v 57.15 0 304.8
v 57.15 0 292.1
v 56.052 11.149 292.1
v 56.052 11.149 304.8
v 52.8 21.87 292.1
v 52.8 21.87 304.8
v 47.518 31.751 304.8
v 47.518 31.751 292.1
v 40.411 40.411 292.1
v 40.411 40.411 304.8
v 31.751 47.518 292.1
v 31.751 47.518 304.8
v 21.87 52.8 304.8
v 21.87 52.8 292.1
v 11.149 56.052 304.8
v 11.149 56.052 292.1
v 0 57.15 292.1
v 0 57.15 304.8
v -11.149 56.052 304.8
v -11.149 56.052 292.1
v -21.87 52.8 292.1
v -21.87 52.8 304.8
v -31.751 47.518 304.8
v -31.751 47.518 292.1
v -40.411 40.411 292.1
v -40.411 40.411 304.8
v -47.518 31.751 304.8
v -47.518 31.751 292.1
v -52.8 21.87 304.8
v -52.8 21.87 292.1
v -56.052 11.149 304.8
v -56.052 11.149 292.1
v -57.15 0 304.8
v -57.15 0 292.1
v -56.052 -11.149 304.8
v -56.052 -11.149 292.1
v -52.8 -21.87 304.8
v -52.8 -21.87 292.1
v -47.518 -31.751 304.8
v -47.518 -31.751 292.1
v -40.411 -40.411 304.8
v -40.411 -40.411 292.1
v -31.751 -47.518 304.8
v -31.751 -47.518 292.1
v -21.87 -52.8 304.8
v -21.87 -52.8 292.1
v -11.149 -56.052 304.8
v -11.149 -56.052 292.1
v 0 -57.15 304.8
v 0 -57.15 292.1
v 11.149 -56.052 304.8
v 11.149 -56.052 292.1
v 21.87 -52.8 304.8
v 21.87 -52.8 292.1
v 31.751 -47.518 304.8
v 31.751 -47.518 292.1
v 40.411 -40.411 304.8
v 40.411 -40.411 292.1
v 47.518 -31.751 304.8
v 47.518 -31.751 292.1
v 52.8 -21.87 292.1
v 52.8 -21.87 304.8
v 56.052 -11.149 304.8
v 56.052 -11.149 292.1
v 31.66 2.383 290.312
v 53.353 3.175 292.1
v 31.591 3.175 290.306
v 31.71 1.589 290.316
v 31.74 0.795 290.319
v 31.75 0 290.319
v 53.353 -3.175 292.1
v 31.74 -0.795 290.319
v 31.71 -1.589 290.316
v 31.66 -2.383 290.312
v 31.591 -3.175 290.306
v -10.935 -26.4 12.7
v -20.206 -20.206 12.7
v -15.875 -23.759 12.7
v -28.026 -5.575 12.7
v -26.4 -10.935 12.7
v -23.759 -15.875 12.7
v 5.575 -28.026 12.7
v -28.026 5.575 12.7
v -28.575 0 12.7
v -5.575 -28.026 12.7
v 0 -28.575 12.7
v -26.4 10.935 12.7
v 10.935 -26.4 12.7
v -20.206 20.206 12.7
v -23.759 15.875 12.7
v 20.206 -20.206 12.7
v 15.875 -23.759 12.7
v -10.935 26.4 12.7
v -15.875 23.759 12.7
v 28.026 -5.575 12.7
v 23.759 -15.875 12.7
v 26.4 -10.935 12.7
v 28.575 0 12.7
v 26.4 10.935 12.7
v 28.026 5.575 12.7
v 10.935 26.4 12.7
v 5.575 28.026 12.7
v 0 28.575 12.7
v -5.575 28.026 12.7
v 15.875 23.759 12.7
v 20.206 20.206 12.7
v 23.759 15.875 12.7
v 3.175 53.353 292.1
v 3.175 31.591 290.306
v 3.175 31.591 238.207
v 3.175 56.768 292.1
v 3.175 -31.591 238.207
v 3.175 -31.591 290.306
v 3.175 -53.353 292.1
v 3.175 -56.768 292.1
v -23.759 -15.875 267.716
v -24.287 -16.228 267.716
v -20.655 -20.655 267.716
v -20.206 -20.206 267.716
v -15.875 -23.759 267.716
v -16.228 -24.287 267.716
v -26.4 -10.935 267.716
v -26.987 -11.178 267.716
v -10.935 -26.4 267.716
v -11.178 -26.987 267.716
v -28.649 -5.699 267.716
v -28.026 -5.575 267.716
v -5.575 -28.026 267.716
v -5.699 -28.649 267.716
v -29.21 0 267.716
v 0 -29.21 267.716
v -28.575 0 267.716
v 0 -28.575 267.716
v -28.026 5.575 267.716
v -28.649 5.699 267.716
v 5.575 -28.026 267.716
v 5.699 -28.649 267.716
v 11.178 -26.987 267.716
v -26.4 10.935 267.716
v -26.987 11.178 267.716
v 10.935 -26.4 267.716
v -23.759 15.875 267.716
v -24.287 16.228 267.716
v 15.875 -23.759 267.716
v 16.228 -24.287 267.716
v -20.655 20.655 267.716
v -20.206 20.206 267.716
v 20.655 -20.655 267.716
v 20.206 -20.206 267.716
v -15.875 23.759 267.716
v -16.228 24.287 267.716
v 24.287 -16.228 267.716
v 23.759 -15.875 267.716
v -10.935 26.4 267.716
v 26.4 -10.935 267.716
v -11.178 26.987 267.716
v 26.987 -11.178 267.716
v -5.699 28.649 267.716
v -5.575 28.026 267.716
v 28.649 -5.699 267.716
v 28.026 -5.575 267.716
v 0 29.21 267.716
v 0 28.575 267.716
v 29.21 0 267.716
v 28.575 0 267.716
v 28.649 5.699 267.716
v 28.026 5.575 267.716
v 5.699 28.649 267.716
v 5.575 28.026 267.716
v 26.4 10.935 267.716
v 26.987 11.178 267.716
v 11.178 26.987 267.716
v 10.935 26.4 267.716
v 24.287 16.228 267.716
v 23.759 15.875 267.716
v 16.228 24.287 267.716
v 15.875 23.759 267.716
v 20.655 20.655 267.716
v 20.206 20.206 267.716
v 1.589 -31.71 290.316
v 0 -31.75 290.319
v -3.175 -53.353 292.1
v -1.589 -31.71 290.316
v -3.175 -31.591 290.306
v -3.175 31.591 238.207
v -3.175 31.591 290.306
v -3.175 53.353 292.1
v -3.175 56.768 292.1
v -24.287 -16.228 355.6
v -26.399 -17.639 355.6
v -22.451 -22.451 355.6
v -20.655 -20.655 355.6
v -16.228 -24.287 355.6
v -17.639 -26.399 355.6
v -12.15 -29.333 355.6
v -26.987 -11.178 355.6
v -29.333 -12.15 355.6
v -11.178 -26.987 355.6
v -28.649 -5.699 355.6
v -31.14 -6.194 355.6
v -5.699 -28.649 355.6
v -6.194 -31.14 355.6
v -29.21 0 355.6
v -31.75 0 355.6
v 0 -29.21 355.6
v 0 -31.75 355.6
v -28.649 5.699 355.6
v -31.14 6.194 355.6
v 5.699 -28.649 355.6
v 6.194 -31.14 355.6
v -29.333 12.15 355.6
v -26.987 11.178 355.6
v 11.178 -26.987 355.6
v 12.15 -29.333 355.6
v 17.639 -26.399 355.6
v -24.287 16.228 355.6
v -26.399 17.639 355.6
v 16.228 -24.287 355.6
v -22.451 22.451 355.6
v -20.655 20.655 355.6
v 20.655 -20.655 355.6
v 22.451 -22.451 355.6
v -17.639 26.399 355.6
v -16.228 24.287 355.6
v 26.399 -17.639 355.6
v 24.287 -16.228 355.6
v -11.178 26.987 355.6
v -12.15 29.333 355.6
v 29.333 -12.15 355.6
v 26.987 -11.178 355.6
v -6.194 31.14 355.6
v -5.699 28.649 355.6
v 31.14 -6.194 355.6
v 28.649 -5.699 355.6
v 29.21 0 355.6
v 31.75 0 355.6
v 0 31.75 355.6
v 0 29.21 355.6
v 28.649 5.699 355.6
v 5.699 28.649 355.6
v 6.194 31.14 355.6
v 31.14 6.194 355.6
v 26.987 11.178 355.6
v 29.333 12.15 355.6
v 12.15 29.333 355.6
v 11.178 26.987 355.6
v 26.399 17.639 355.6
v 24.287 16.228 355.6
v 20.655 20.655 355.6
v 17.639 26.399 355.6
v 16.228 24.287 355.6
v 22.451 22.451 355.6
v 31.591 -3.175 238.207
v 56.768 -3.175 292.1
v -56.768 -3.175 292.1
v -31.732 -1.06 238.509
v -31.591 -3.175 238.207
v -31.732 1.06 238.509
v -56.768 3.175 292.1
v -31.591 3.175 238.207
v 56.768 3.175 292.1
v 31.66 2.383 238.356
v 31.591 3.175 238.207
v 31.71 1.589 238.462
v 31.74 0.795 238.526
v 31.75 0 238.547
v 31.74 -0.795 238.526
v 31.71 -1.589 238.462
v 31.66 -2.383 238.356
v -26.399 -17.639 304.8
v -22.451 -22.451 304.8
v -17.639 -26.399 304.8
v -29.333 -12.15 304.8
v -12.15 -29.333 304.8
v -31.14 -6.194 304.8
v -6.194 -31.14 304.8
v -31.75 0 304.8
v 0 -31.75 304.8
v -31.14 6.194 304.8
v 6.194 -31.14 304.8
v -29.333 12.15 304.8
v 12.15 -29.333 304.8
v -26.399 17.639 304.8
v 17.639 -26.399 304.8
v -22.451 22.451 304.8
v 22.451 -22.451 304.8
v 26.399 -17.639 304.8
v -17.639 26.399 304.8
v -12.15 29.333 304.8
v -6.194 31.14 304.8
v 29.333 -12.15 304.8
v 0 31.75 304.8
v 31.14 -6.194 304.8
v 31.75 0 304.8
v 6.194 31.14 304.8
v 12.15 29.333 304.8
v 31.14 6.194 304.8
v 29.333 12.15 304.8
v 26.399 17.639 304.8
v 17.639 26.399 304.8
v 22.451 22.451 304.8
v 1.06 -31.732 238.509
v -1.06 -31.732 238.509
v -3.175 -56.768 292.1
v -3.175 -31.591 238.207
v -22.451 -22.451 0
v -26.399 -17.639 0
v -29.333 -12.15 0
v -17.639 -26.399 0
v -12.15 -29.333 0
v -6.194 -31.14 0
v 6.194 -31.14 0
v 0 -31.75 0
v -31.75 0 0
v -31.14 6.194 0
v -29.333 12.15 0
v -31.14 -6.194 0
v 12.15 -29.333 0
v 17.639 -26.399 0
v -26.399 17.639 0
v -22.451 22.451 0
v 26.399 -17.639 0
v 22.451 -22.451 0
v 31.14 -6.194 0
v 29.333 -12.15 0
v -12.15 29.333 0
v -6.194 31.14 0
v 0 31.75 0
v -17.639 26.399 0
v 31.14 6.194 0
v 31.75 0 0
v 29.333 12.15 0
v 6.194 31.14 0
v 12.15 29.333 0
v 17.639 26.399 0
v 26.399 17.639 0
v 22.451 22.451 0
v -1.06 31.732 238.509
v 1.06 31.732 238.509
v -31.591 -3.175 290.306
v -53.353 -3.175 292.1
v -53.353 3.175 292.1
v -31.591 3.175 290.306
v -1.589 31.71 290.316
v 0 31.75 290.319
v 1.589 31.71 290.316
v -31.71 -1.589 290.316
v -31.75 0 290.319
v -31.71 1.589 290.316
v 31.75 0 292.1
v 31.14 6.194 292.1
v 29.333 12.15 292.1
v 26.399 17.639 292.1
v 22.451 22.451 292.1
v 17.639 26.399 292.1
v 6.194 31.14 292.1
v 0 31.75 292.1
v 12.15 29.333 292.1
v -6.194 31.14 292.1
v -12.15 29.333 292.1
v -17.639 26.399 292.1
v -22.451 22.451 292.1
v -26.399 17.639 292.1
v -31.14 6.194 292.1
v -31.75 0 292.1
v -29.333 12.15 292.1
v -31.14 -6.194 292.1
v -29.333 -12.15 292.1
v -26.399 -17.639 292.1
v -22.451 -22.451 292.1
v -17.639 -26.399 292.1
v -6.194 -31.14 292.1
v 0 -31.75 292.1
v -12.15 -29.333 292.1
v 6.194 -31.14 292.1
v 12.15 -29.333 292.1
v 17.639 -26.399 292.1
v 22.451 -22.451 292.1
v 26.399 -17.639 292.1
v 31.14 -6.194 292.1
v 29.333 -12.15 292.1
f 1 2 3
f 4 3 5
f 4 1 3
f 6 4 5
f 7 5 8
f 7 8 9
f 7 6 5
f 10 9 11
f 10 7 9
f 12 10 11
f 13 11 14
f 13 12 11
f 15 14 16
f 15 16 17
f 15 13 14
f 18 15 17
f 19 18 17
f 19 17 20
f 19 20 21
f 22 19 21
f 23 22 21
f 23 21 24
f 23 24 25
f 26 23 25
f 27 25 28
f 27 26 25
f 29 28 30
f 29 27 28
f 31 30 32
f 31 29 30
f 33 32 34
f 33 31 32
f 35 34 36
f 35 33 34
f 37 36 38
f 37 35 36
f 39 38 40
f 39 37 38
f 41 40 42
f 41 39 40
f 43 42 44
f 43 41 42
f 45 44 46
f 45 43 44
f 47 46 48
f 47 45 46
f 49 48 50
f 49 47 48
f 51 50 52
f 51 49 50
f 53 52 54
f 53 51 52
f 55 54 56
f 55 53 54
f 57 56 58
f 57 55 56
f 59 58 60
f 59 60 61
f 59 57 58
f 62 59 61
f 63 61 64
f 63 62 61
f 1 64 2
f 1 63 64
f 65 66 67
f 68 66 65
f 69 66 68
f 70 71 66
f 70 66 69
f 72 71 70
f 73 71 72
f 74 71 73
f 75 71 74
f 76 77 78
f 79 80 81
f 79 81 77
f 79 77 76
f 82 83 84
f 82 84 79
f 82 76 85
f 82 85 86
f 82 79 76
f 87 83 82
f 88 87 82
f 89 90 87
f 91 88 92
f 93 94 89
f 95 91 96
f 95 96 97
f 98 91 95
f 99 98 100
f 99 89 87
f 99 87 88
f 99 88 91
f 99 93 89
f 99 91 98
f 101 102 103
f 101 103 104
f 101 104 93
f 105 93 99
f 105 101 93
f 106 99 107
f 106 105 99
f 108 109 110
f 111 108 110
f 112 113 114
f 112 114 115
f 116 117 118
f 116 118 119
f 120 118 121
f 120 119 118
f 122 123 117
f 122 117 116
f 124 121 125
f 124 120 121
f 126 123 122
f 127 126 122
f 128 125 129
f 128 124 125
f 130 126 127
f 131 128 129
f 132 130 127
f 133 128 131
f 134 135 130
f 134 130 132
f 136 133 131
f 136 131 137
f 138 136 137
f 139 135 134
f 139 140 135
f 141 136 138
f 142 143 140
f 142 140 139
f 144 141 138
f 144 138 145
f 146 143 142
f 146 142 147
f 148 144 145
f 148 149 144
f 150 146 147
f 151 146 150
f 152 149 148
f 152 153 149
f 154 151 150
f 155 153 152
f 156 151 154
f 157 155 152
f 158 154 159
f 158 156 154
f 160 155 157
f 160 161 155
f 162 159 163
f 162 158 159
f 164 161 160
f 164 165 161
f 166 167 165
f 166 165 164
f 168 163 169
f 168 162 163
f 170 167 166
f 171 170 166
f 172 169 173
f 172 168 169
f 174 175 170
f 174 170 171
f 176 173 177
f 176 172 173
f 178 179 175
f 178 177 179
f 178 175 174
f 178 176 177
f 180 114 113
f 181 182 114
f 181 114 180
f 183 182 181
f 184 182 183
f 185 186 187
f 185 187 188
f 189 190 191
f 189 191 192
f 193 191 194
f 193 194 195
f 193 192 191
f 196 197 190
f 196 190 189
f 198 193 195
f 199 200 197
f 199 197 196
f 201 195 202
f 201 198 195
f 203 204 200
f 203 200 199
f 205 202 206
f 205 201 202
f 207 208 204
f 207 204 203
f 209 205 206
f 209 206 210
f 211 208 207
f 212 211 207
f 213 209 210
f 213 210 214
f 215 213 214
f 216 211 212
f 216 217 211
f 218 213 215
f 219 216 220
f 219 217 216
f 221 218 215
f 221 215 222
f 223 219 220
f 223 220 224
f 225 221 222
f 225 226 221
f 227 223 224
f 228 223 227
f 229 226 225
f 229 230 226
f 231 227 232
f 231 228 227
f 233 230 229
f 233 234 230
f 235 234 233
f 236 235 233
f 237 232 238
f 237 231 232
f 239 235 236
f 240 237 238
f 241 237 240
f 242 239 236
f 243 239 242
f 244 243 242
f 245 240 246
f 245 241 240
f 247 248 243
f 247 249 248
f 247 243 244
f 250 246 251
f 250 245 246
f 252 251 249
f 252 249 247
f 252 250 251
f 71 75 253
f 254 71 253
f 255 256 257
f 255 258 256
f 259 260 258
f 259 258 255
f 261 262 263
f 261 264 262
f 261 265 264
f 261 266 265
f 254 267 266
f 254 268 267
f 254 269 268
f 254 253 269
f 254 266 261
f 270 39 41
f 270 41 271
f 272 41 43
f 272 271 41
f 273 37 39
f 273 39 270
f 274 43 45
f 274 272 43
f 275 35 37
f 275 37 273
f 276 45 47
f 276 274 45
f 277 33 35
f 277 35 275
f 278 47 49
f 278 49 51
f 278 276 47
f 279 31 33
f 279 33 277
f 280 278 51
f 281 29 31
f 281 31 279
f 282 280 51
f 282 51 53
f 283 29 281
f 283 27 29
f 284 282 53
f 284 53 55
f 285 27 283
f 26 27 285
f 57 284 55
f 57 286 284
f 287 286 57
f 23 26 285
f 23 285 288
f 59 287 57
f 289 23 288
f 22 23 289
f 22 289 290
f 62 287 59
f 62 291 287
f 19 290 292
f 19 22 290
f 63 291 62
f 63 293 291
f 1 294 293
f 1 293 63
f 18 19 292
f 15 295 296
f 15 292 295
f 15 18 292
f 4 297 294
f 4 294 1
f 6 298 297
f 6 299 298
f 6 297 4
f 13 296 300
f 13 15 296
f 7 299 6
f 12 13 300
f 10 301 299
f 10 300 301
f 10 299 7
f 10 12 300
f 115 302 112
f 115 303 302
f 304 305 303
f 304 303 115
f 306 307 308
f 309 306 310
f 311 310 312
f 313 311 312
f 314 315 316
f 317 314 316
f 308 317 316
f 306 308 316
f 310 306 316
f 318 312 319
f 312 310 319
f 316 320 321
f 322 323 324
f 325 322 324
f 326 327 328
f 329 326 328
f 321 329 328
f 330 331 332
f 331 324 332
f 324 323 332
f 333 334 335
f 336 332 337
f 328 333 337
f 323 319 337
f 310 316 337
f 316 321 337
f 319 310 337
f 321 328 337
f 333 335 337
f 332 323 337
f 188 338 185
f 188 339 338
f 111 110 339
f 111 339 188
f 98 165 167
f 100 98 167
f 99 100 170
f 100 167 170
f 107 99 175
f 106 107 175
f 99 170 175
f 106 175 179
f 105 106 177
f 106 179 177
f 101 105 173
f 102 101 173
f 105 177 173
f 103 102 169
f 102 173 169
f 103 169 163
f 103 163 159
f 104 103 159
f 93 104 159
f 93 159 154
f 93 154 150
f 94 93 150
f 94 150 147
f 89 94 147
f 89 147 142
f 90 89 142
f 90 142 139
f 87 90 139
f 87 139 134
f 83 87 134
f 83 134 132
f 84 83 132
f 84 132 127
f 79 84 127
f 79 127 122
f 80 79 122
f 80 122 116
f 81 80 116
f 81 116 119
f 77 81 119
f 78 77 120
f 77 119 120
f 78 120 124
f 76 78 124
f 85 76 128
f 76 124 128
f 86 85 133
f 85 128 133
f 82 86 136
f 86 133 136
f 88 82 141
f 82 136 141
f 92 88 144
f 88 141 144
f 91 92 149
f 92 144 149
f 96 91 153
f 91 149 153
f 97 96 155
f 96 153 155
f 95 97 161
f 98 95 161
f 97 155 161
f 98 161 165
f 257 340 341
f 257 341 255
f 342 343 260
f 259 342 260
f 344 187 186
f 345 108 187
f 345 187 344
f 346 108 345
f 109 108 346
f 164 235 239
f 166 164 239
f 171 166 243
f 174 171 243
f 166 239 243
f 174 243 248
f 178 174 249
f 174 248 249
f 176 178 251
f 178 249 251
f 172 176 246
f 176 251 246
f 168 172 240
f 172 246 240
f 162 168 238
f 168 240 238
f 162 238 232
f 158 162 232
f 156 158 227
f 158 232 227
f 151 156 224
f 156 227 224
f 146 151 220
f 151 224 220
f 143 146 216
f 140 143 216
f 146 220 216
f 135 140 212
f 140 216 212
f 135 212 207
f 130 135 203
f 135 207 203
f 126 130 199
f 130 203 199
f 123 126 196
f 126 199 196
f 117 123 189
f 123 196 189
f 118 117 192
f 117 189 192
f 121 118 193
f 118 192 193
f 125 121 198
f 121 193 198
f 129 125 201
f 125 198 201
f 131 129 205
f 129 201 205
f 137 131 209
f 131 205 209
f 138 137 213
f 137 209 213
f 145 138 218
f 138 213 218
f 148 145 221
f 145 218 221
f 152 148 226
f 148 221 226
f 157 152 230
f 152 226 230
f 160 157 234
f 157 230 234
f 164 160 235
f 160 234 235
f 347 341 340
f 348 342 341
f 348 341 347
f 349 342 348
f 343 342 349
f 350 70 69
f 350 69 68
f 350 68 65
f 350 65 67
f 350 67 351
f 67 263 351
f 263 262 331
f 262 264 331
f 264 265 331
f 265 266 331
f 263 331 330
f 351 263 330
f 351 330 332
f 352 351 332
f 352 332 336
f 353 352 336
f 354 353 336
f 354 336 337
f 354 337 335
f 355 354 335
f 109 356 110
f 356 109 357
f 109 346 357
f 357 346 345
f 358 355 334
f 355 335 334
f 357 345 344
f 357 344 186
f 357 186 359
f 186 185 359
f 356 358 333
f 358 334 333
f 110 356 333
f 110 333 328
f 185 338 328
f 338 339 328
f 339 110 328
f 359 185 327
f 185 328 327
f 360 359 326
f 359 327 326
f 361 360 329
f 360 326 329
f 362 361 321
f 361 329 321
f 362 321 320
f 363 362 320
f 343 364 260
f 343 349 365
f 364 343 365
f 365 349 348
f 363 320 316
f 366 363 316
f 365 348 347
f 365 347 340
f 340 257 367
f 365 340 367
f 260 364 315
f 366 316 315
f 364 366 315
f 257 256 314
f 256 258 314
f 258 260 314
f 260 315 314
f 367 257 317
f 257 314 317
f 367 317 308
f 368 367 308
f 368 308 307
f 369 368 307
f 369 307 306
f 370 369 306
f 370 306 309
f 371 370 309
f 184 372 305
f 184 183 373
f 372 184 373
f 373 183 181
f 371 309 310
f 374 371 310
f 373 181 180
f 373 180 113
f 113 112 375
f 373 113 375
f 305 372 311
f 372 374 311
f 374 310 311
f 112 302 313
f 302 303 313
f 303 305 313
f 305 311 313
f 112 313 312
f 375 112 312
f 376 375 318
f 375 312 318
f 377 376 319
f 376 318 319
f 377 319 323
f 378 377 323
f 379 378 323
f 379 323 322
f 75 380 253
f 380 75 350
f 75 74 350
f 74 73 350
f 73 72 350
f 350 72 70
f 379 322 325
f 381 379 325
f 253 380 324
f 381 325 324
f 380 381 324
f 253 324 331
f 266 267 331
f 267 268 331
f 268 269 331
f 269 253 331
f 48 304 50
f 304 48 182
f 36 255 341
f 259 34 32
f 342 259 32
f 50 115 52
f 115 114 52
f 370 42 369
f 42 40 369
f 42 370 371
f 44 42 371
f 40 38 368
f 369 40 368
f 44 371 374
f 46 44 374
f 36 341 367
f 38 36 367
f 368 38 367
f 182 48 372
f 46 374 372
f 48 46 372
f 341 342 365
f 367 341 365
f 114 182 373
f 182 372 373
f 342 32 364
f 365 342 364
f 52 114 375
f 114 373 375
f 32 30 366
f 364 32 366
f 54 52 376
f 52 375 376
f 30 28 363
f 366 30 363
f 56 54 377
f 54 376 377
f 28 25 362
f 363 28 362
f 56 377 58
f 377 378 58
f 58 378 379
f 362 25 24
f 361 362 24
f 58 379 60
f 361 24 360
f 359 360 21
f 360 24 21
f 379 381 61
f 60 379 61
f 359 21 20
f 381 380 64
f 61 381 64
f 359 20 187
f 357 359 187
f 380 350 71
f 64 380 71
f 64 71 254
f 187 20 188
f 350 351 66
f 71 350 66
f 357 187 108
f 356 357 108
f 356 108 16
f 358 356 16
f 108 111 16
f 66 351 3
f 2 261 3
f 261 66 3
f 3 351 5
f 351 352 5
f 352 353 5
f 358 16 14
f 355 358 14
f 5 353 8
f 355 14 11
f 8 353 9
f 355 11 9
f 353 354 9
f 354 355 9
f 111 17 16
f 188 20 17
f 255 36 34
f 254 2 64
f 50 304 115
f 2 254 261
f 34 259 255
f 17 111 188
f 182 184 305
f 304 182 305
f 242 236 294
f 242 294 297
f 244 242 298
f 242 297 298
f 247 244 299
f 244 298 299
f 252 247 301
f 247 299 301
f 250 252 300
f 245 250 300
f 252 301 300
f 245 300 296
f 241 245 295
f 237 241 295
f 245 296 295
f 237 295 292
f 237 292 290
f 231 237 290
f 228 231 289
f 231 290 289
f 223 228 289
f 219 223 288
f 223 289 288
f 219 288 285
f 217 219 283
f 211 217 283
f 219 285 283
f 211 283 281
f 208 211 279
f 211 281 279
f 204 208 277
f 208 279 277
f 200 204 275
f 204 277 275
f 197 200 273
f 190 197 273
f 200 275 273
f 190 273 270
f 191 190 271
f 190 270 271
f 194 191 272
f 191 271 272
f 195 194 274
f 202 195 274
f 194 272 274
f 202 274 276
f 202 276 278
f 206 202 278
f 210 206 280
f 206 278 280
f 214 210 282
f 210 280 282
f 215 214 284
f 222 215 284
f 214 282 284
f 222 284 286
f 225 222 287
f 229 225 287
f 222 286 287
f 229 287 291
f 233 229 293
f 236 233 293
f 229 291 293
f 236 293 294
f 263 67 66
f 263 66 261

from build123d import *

# Parameters (mm, degrees)
F0_R            = 31.75
F1_DEPTH        = 304.8
F2_R            = 28.575
F3_DEPTH        = 292.1
F4_R            = 57.15
F4_R_2          = 31.75
F5_DEPTH        = 12.7
F7_DEPTH        = 3.175
F7_COPIES_COUNT = 4
F8_R            = 31.75
F9_DEPTH        = 50.8
F10_R           = 29.21
F11_DEPTH       = 87.884


# Not quite as in the source:
# - a pattern or mirror of a feature is missing from the dataset's text; its kind, count and spacing are read off the source's solid


with BuildPart() as f1:
    # F0 (on Top) → F1 (new body)
    with BuildSketch(Plane.XY):
        Circle(F0_R)
    extrude(amount=F1_DEPTH)

    # F2 (on face) → F3 (cut)
    with BuildSketch(Plane.XY.offset(304.8)):
        Circle(F2_R)
    extrude(amount=-F3_DEPTH, mode=Mode.SUBTRACT)

    # F4 (on face) → F5 (join)
    with BuildSketch(Plane.XY.offset(304.8)):
        Circle(F4_R)
        Circle(F4_R_2, mode=Mode.SUBTRACT)
    extrude(amount=-F5_DEPTH)

    # F6 (on Right) → F7 (join, symmetric)
    with BuildSketch(Plane.YZ):
        Polygon((30.9059452266, 236.7404699326), (56.9043979049, 292.3926711082), (30.9059452266, 290.2498841286), align=None)
    f7 = extrude(amount=F7_DEPTH, both=True)

    # F7_copies: F7 ×4 about axis
    f7_copies_axis = Axis((0, 0, 0), (0, 0, 1))
    for i in range(1, F7_COPIES_COUNT):
        add(f7.rotate(f7_copies_axis, i * 360 / F7_COPIES_COUNT))

    # F8 (on face) → F9 (join)
    with BuildSketch(Plane.XY.offset(304.8)):
        Circle(F8_R)
    extrude(amount=F9_DEPTH)

    # F10 (on face) → F11 (cut)
    with BuildSketch(Plane.XY.offset(355.6)):
        Circle(F10_R)
    extrude(amount=-F11_DEPTH, mode=Mode.SUBTRACT)


solid = f1.part
